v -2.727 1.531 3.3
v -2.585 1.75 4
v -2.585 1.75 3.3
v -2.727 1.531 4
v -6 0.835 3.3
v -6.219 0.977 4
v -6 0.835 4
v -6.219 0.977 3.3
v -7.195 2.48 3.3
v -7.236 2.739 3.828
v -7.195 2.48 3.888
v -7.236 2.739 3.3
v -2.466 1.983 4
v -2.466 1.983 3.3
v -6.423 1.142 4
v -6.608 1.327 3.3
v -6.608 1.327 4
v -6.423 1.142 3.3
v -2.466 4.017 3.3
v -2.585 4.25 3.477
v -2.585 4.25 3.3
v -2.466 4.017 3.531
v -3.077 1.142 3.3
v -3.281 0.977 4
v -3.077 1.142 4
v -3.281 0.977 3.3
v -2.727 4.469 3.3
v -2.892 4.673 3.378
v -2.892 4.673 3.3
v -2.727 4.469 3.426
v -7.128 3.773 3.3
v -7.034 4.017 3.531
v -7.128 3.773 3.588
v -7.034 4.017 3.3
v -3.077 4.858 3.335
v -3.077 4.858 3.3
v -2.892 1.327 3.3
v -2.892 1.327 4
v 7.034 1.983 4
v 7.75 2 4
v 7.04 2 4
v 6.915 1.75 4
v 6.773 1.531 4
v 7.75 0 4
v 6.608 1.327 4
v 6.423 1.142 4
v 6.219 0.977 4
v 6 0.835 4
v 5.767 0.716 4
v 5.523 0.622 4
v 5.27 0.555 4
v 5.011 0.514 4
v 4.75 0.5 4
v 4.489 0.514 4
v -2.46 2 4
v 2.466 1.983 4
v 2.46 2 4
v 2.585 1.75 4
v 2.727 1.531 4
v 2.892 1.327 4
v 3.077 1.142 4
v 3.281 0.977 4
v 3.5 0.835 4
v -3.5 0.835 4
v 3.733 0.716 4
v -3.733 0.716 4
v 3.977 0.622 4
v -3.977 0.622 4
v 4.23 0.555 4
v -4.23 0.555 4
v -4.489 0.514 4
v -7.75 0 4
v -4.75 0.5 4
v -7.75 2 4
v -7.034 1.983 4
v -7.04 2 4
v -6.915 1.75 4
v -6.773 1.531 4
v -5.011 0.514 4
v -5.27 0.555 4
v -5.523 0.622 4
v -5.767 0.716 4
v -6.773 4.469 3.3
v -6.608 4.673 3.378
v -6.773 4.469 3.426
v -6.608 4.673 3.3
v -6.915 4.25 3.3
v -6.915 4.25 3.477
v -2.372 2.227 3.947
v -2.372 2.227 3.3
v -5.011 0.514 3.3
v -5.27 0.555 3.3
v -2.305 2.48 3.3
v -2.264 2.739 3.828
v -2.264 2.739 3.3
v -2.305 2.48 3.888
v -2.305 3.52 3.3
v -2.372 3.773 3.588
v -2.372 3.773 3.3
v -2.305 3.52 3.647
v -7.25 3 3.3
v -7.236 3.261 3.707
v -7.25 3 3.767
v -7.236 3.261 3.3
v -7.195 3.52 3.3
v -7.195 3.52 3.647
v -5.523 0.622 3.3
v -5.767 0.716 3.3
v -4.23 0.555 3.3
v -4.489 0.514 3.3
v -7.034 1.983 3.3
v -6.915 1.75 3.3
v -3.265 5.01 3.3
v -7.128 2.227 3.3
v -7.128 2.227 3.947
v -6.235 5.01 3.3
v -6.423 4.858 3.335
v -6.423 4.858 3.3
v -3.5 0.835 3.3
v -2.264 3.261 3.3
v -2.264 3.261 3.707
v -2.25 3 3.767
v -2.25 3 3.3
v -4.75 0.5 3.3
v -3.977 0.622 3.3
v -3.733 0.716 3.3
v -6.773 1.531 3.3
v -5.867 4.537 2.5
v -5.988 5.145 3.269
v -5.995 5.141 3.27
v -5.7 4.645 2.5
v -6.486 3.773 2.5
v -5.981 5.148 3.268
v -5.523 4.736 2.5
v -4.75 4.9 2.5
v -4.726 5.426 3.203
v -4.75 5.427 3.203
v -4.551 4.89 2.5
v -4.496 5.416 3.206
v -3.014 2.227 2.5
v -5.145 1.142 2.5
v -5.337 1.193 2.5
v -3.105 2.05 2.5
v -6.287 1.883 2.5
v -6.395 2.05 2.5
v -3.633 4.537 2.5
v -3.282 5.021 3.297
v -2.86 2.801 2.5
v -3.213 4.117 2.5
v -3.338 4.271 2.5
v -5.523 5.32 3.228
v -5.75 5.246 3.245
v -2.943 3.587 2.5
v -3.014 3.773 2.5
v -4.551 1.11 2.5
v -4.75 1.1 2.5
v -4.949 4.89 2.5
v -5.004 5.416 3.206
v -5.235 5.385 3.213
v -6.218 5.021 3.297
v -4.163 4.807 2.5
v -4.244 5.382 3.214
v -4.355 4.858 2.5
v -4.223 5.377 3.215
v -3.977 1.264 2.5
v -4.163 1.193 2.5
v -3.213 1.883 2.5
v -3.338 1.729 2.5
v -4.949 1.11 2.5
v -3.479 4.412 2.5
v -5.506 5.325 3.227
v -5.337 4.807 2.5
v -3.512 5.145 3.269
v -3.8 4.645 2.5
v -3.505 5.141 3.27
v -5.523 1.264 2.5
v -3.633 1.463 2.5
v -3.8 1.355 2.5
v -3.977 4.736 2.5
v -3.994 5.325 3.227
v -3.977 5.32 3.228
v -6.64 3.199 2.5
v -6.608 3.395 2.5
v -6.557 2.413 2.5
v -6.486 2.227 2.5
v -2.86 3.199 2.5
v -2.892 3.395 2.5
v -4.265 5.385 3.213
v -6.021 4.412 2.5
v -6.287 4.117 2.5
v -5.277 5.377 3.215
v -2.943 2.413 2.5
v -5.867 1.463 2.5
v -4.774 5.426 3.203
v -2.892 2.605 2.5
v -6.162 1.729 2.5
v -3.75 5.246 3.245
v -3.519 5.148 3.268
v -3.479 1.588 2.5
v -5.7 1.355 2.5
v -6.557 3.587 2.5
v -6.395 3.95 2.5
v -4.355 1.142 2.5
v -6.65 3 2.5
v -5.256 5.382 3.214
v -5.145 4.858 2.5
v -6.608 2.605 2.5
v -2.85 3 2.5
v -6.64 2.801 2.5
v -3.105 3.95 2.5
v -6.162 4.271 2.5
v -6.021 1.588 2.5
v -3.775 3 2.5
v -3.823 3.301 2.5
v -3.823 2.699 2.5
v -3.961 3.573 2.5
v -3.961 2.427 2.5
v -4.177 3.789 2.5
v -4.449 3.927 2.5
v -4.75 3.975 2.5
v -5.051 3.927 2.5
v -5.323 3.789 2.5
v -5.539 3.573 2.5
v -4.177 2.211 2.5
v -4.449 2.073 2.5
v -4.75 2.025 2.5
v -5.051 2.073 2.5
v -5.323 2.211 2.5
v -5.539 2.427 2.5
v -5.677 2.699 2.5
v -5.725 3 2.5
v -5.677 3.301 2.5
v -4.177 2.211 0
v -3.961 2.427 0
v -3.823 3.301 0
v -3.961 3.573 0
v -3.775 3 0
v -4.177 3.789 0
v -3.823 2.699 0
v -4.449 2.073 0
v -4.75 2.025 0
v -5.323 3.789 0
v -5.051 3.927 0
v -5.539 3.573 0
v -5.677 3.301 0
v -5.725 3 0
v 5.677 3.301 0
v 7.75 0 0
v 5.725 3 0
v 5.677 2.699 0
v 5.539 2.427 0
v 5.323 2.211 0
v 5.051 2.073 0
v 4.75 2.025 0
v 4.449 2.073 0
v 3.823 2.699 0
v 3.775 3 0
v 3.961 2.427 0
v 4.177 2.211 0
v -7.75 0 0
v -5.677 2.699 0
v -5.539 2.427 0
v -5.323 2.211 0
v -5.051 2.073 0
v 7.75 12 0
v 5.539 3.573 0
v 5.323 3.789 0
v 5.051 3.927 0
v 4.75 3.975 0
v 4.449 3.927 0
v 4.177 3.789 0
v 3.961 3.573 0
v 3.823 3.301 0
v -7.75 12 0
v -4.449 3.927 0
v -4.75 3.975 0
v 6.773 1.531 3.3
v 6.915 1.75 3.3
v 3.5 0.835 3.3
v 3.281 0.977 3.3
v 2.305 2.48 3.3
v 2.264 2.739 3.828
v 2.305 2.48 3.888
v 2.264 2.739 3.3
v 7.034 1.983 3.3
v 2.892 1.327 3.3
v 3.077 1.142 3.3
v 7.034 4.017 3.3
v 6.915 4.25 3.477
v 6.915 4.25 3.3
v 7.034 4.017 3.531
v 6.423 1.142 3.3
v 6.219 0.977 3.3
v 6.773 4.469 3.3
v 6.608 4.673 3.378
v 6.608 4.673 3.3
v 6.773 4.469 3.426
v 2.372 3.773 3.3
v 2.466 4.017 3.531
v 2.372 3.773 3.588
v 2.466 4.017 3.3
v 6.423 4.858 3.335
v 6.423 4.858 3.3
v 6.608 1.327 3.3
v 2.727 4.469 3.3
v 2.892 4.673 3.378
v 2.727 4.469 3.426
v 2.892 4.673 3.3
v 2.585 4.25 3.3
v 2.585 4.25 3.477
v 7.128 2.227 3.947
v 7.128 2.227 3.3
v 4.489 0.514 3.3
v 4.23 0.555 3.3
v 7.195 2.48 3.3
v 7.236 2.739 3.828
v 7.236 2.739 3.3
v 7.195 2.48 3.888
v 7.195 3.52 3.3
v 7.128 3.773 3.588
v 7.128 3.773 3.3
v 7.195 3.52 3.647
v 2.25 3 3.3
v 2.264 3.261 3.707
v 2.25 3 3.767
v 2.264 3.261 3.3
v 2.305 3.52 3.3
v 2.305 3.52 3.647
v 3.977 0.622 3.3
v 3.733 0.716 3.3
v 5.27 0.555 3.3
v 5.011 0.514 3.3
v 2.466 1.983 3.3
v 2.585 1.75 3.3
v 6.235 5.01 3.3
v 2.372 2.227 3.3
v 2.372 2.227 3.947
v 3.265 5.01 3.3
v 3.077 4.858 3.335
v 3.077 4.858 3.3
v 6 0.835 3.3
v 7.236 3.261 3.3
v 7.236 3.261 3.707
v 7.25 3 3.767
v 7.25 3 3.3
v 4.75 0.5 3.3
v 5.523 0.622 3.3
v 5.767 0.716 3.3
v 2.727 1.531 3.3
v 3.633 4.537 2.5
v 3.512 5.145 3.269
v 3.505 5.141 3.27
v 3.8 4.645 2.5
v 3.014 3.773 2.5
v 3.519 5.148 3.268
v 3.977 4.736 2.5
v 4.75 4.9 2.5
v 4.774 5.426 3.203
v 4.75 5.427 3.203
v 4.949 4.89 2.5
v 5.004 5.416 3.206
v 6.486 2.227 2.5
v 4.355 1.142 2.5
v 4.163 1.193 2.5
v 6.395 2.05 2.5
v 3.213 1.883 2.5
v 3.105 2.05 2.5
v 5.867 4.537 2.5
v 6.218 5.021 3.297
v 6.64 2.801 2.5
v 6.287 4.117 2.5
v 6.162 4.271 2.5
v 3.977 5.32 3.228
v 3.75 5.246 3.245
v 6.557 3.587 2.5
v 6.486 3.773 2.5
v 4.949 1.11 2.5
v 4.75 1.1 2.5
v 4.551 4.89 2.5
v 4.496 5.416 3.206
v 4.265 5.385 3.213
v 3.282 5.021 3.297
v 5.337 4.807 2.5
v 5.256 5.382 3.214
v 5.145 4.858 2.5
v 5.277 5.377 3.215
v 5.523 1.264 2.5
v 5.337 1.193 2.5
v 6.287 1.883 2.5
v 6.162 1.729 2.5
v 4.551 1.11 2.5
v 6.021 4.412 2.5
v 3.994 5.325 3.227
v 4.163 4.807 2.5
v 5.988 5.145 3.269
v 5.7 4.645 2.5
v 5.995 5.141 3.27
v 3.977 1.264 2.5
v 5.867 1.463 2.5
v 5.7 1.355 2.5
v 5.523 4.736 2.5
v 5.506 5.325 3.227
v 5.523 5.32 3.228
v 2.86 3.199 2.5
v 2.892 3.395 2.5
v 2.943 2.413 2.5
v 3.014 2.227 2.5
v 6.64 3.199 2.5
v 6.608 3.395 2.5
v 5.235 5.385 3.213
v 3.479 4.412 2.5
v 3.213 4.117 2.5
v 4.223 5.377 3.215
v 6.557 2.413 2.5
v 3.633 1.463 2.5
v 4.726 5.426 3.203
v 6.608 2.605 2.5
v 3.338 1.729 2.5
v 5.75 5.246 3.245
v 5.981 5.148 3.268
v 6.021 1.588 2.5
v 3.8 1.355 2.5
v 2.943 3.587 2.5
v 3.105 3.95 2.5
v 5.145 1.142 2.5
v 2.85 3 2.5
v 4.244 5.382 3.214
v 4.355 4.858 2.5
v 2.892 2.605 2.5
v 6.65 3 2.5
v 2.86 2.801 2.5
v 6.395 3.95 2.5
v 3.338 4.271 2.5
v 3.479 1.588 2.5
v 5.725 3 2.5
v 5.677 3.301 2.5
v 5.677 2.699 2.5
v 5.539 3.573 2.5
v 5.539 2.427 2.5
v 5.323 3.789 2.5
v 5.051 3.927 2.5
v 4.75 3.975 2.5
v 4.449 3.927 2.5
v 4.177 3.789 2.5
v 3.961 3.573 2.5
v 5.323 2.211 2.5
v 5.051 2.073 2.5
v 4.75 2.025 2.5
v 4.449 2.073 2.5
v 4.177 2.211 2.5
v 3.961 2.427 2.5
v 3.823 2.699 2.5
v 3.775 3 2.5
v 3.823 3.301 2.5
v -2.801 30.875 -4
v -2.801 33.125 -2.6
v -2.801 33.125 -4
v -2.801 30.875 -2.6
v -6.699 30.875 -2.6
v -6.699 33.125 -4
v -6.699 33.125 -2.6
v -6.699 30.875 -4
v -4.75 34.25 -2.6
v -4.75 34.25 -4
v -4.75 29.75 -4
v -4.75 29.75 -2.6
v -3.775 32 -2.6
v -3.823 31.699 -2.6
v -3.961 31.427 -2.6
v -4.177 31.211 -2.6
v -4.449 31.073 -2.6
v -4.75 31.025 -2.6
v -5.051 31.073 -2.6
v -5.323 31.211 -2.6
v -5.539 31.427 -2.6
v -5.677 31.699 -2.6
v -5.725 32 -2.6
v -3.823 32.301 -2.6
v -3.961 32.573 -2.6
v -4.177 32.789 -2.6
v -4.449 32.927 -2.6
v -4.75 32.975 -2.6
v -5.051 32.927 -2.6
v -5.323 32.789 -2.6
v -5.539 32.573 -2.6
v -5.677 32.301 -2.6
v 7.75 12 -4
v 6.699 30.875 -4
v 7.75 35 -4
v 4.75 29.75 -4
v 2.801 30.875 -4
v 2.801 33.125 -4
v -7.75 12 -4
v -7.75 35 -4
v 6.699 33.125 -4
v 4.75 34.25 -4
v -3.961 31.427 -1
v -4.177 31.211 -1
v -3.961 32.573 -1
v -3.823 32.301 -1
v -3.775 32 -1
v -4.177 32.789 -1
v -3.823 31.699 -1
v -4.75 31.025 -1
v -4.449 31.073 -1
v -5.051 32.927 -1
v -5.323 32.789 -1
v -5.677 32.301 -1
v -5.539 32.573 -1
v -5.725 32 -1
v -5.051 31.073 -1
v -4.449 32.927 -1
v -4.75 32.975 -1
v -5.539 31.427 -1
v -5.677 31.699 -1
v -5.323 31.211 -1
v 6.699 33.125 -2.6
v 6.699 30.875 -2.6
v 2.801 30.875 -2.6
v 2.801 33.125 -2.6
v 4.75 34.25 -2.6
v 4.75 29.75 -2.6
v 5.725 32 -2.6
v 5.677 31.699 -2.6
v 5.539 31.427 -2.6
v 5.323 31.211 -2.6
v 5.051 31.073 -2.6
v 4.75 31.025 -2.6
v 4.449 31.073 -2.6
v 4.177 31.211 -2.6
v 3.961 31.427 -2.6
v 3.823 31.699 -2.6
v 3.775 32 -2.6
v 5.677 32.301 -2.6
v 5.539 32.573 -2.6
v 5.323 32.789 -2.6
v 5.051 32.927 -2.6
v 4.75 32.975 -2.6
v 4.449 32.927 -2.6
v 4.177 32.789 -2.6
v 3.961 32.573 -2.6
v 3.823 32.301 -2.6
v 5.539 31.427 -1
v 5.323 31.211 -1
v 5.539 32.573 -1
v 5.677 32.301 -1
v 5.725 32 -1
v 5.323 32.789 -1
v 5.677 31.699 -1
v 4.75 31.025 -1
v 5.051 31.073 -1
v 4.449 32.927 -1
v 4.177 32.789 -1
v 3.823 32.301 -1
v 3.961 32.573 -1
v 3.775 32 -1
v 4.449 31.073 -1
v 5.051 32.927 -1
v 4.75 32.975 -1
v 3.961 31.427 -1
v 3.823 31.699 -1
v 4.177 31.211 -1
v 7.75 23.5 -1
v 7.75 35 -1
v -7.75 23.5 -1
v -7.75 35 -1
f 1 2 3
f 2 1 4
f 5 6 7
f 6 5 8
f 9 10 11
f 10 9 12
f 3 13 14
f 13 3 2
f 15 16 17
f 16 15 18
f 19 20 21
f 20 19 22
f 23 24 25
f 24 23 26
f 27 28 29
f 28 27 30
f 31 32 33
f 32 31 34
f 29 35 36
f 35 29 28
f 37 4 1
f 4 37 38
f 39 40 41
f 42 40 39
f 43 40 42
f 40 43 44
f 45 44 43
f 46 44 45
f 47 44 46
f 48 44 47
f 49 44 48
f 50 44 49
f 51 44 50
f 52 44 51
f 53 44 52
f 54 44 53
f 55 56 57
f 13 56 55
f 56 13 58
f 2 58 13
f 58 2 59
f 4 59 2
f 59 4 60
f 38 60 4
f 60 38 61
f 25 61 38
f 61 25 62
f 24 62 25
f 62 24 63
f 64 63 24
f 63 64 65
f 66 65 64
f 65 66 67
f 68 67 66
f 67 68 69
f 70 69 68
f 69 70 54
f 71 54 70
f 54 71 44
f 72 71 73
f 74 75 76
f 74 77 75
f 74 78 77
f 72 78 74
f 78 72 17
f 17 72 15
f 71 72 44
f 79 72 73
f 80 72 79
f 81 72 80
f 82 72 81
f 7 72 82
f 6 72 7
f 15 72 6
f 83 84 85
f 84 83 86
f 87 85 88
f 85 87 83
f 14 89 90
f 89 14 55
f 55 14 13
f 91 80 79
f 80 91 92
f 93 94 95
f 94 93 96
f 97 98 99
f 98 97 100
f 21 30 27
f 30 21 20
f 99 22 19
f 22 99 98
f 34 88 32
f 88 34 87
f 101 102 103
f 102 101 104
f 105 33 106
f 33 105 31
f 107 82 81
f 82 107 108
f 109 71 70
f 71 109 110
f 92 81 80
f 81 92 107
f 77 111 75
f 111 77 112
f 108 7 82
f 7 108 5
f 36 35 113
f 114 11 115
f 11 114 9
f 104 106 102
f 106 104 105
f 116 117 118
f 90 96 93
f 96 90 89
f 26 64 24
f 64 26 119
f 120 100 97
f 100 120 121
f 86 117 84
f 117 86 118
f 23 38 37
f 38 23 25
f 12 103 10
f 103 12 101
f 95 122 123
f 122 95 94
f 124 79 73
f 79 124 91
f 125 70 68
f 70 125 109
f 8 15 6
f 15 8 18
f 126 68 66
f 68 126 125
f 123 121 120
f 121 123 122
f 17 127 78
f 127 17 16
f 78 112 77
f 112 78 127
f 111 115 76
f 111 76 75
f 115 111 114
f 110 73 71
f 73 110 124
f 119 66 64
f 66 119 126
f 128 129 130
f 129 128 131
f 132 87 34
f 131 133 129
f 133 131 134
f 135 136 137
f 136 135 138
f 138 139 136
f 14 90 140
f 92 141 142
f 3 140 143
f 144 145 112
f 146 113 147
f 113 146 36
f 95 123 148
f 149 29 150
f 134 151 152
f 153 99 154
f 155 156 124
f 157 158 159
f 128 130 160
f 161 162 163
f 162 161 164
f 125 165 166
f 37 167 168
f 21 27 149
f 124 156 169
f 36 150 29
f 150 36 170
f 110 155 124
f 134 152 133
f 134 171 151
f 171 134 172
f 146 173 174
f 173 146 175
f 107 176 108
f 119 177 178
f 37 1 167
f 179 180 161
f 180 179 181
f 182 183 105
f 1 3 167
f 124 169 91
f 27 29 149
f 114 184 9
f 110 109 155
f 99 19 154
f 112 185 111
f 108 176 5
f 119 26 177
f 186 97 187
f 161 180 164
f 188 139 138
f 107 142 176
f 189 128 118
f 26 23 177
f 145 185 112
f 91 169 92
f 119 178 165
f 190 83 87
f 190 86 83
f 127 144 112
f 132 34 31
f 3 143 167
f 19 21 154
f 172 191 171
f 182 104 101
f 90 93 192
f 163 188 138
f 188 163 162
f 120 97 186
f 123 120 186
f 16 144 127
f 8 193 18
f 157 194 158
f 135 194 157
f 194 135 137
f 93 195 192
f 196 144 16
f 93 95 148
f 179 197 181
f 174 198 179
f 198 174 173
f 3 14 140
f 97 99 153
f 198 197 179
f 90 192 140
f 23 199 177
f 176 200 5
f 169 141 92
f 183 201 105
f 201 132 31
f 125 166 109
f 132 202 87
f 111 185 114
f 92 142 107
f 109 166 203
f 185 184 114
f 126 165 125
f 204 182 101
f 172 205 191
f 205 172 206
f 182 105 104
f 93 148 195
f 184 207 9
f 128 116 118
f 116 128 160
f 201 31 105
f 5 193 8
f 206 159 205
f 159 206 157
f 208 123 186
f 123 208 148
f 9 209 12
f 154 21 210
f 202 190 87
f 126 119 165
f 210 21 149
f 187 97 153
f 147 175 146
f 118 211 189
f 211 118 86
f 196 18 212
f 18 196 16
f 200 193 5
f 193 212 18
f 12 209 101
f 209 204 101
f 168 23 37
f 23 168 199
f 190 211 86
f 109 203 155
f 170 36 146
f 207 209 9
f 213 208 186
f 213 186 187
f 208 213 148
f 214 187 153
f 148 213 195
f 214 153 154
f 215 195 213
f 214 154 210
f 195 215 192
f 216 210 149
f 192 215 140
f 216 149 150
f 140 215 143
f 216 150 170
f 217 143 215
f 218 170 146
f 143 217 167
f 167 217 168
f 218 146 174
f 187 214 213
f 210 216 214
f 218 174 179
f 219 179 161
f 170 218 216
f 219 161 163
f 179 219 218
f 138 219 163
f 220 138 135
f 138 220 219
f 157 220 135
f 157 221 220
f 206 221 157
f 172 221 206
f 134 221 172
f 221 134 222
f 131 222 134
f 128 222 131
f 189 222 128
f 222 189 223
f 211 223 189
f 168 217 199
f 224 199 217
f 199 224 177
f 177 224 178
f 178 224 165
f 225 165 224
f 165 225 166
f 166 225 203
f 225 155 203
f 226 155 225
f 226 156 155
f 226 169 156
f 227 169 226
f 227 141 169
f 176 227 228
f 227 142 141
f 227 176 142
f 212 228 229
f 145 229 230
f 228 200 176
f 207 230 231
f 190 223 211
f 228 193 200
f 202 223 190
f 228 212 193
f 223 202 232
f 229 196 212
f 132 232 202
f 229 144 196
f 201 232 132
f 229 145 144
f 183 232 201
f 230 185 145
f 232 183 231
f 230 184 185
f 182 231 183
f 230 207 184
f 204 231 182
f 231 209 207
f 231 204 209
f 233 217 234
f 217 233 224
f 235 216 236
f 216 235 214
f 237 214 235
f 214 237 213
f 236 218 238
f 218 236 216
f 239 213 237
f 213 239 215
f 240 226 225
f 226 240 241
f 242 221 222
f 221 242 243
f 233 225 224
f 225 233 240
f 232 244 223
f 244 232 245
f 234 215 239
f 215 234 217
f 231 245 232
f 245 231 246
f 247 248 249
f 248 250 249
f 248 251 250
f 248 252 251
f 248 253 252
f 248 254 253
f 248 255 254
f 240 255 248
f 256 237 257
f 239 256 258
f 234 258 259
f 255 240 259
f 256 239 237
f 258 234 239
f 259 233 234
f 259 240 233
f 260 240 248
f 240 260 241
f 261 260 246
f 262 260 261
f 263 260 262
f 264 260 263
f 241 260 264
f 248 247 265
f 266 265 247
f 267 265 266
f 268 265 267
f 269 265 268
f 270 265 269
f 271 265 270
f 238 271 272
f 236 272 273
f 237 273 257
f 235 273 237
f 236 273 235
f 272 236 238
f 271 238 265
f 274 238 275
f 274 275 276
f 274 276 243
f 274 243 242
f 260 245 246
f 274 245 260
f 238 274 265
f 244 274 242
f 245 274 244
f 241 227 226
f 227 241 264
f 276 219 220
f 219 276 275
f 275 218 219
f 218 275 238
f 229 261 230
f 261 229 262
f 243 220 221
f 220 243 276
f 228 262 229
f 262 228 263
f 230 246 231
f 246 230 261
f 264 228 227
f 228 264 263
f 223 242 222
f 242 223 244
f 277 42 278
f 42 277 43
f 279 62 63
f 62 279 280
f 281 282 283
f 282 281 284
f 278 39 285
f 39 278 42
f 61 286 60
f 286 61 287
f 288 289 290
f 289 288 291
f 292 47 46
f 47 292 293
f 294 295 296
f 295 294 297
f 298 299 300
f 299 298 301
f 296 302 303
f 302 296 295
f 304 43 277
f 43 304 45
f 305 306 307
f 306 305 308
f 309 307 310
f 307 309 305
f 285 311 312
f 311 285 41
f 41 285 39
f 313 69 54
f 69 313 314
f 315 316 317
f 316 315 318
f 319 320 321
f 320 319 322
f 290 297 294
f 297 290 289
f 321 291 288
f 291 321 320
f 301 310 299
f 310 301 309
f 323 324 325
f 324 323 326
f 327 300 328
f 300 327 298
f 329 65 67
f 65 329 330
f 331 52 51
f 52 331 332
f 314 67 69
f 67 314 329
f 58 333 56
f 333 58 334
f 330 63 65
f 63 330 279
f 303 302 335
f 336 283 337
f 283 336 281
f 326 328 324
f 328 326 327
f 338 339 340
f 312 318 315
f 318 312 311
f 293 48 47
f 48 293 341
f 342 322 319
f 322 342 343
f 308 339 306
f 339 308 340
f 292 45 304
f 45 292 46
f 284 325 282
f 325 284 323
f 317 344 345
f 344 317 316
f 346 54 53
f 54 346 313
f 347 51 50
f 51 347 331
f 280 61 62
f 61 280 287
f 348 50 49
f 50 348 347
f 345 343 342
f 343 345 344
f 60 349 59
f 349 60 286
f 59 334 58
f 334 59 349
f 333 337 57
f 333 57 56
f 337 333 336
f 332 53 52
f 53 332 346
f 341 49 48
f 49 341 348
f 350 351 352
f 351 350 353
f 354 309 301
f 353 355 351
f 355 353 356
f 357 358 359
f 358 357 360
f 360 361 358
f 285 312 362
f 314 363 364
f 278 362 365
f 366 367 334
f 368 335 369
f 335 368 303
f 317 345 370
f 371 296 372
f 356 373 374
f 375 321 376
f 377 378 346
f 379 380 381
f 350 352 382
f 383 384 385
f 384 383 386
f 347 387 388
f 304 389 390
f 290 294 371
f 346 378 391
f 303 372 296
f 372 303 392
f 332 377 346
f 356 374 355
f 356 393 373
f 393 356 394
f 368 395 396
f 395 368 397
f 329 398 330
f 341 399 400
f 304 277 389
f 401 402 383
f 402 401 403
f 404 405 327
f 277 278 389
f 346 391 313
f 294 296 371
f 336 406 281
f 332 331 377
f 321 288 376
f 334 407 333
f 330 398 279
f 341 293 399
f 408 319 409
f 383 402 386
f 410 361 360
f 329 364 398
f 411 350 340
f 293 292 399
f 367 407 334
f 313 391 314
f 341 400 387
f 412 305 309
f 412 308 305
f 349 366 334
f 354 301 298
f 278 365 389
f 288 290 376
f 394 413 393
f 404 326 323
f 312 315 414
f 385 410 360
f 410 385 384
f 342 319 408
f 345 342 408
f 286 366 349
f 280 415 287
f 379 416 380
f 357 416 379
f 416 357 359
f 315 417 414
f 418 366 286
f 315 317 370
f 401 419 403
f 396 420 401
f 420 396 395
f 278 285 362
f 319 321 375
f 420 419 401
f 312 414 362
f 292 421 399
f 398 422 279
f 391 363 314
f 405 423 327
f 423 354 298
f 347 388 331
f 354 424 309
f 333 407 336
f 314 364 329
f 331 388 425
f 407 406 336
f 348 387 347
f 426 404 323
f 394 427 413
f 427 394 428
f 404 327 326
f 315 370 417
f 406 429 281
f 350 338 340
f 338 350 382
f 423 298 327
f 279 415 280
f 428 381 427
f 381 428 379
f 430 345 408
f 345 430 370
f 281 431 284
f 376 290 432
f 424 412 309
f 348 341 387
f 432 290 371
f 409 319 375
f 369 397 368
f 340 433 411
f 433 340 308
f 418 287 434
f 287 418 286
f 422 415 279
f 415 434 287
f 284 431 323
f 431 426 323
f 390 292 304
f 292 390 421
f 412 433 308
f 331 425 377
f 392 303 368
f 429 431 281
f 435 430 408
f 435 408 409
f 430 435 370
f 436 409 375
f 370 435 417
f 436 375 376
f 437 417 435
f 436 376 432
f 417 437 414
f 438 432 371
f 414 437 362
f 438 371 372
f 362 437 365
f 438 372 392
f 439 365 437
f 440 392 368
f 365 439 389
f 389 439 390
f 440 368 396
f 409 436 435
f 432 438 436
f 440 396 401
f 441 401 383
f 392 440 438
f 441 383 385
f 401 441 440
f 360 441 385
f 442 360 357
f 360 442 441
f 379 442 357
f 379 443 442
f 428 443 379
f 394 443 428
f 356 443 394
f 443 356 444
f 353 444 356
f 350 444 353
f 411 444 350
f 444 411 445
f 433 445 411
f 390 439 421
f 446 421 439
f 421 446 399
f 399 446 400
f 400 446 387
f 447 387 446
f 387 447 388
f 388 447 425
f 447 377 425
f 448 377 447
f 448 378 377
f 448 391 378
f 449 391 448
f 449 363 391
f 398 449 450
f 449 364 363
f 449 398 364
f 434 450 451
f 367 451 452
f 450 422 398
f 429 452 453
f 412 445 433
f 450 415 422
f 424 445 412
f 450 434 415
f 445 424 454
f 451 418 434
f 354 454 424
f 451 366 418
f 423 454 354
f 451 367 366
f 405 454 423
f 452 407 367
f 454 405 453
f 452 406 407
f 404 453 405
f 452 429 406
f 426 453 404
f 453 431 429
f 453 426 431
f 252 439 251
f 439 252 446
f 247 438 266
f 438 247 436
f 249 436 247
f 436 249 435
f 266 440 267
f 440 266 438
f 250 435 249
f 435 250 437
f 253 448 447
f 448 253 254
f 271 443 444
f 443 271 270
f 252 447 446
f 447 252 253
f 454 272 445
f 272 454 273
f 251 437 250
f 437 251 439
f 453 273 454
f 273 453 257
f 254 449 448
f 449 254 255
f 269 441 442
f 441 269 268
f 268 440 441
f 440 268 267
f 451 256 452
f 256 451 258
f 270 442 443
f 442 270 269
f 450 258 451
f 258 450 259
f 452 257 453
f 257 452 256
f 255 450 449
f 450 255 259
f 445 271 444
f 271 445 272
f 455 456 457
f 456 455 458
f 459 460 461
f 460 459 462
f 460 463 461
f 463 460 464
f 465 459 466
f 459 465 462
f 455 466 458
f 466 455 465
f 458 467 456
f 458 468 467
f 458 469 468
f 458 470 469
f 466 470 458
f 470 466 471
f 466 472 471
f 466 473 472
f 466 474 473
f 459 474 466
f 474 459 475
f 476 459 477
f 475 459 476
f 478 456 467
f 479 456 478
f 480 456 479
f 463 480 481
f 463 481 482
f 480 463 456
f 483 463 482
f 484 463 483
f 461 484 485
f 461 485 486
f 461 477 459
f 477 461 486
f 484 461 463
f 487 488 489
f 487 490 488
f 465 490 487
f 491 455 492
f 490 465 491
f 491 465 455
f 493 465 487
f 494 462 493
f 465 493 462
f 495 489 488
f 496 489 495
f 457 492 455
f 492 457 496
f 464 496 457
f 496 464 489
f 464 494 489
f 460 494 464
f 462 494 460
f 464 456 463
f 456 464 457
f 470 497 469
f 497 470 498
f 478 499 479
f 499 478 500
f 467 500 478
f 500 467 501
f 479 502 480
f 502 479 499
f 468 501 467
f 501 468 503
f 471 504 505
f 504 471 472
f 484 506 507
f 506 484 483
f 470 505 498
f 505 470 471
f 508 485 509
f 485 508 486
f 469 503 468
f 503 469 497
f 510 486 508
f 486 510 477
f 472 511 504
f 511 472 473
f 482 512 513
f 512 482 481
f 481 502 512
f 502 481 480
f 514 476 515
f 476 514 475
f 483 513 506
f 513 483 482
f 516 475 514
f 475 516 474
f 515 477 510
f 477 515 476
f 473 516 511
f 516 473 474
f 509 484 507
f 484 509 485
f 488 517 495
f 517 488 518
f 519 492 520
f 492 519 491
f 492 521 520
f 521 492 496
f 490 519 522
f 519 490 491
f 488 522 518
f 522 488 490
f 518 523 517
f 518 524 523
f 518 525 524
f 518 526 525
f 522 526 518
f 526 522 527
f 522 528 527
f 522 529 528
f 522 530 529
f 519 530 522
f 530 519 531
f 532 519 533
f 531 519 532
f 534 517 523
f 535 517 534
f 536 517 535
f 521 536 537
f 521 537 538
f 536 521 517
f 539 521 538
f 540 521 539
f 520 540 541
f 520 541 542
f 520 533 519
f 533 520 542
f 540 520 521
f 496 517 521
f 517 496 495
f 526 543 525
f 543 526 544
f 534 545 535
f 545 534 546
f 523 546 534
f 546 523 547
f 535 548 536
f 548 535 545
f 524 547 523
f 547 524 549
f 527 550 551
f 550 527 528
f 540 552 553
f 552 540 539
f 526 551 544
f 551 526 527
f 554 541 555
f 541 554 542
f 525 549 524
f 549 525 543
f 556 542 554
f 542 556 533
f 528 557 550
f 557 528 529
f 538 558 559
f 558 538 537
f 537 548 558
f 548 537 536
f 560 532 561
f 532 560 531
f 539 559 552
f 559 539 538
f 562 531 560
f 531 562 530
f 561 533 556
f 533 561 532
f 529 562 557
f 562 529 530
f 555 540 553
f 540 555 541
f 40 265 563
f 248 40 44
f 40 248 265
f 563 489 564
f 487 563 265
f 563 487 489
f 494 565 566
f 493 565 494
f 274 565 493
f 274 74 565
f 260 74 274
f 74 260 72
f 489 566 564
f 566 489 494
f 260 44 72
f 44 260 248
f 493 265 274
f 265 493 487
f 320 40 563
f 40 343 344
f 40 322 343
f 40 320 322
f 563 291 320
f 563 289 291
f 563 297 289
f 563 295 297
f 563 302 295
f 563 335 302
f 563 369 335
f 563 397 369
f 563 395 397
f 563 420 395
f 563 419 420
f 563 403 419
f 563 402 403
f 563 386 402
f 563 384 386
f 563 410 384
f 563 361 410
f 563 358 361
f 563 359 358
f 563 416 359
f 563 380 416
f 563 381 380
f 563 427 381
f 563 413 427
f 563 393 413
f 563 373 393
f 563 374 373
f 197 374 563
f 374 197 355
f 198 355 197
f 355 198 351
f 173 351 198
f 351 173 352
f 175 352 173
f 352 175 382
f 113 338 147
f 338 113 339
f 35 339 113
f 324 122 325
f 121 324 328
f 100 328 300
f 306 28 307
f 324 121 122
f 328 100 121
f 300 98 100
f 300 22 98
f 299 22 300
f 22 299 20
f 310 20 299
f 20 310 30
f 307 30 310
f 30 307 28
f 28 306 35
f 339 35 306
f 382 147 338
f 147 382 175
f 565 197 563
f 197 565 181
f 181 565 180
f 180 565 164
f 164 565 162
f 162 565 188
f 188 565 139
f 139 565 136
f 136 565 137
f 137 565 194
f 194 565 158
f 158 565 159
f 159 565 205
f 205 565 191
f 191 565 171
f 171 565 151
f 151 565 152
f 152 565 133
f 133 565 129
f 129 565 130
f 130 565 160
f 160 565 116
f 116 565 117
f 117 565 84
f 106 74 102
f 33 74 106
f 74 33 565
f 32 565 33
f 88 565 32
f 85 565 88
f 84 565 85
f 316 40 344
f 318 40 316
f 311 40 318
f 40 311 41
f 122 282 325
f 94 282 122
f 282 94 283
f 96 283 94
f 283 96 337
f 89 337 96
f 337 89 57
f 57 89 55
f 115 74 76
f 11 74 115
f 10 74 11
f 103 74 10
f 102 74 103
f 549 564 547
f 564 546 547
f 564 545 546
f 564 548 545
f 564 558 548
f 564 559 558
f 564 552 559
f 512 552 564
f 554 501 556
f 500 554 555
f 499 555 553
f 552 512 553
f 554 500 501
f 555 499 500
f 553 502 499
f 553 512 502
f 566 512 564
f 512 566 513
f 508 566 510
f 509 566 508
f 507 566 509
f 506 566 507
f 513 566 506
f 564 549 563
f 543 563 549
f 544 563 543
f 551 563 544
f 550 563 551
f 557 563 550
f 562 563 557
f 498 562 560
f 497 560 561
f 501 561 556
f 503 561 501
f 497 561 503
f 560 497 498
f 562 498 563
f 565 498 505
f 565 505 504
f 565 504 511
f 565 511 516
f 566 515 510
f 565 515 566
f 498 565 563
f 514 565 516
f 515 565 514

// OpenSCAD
/* Copyright 2021 Alex Volkov <alex@flamy.ca>
 * GNU GPL v3
 */
 
// Using measurements from x-end mototr with the following license
// PRUSA iteration4
// X end motor
// GNU GPL v3
// Josef Průša <iam@josefprusa.cz> and contributors
// http://www.reprap.org/wiki/Prusa_Mendel
// http://prusamendel.org

include <../libs/hardware-recess.scad>;

endstop_offset=35;
extra_width = 6;

module endstop_mount(){
    translate([-4.75,0,0])hole_w_end(4, 1.4, "round", M2);
    // Front screw hole for endstop
    translate([4.75,0,0])hole_w_end(4, 1.4, "round", M2);
}

module endstop_nut(hole_len){
    translate([-4.75,0,-2])hole_w_end(hole_len, 1.4, "hex", M2, flip=true);
    // Front screw hole for endstop
    translate([4.75,0,-2])hole_w_end(hole_len, 1.4, "hex", M2, flip=true);
}


difference(){
    translate([-4.75 - extra_width/2, 0, -4]) 
        cube([4.75*2 + extra_width , endstop_offset, 8]);
    translate([-4.75 - extra_width/2 , 0, -5]) 
            cube([4.75*2 + extra_width , 12 , 5]);
    
    hull(){
        translate([-4.75 - extra_width/2, endstop_offset /2 + 6, -1]) 
            cube([4.75*2 + extra_width , endstop_offset, 3]);
        translate([-4.75 - extra_width/2, 2, 4]) 
            cube([4.75*2 + extra_width , endstop_offset, 0.5]);
    }
    
    translate([0, 3, 0])
        endstop_mount();
    translate([0, endstop_offset - 3, -2])
        endstop_nut(5);
}
